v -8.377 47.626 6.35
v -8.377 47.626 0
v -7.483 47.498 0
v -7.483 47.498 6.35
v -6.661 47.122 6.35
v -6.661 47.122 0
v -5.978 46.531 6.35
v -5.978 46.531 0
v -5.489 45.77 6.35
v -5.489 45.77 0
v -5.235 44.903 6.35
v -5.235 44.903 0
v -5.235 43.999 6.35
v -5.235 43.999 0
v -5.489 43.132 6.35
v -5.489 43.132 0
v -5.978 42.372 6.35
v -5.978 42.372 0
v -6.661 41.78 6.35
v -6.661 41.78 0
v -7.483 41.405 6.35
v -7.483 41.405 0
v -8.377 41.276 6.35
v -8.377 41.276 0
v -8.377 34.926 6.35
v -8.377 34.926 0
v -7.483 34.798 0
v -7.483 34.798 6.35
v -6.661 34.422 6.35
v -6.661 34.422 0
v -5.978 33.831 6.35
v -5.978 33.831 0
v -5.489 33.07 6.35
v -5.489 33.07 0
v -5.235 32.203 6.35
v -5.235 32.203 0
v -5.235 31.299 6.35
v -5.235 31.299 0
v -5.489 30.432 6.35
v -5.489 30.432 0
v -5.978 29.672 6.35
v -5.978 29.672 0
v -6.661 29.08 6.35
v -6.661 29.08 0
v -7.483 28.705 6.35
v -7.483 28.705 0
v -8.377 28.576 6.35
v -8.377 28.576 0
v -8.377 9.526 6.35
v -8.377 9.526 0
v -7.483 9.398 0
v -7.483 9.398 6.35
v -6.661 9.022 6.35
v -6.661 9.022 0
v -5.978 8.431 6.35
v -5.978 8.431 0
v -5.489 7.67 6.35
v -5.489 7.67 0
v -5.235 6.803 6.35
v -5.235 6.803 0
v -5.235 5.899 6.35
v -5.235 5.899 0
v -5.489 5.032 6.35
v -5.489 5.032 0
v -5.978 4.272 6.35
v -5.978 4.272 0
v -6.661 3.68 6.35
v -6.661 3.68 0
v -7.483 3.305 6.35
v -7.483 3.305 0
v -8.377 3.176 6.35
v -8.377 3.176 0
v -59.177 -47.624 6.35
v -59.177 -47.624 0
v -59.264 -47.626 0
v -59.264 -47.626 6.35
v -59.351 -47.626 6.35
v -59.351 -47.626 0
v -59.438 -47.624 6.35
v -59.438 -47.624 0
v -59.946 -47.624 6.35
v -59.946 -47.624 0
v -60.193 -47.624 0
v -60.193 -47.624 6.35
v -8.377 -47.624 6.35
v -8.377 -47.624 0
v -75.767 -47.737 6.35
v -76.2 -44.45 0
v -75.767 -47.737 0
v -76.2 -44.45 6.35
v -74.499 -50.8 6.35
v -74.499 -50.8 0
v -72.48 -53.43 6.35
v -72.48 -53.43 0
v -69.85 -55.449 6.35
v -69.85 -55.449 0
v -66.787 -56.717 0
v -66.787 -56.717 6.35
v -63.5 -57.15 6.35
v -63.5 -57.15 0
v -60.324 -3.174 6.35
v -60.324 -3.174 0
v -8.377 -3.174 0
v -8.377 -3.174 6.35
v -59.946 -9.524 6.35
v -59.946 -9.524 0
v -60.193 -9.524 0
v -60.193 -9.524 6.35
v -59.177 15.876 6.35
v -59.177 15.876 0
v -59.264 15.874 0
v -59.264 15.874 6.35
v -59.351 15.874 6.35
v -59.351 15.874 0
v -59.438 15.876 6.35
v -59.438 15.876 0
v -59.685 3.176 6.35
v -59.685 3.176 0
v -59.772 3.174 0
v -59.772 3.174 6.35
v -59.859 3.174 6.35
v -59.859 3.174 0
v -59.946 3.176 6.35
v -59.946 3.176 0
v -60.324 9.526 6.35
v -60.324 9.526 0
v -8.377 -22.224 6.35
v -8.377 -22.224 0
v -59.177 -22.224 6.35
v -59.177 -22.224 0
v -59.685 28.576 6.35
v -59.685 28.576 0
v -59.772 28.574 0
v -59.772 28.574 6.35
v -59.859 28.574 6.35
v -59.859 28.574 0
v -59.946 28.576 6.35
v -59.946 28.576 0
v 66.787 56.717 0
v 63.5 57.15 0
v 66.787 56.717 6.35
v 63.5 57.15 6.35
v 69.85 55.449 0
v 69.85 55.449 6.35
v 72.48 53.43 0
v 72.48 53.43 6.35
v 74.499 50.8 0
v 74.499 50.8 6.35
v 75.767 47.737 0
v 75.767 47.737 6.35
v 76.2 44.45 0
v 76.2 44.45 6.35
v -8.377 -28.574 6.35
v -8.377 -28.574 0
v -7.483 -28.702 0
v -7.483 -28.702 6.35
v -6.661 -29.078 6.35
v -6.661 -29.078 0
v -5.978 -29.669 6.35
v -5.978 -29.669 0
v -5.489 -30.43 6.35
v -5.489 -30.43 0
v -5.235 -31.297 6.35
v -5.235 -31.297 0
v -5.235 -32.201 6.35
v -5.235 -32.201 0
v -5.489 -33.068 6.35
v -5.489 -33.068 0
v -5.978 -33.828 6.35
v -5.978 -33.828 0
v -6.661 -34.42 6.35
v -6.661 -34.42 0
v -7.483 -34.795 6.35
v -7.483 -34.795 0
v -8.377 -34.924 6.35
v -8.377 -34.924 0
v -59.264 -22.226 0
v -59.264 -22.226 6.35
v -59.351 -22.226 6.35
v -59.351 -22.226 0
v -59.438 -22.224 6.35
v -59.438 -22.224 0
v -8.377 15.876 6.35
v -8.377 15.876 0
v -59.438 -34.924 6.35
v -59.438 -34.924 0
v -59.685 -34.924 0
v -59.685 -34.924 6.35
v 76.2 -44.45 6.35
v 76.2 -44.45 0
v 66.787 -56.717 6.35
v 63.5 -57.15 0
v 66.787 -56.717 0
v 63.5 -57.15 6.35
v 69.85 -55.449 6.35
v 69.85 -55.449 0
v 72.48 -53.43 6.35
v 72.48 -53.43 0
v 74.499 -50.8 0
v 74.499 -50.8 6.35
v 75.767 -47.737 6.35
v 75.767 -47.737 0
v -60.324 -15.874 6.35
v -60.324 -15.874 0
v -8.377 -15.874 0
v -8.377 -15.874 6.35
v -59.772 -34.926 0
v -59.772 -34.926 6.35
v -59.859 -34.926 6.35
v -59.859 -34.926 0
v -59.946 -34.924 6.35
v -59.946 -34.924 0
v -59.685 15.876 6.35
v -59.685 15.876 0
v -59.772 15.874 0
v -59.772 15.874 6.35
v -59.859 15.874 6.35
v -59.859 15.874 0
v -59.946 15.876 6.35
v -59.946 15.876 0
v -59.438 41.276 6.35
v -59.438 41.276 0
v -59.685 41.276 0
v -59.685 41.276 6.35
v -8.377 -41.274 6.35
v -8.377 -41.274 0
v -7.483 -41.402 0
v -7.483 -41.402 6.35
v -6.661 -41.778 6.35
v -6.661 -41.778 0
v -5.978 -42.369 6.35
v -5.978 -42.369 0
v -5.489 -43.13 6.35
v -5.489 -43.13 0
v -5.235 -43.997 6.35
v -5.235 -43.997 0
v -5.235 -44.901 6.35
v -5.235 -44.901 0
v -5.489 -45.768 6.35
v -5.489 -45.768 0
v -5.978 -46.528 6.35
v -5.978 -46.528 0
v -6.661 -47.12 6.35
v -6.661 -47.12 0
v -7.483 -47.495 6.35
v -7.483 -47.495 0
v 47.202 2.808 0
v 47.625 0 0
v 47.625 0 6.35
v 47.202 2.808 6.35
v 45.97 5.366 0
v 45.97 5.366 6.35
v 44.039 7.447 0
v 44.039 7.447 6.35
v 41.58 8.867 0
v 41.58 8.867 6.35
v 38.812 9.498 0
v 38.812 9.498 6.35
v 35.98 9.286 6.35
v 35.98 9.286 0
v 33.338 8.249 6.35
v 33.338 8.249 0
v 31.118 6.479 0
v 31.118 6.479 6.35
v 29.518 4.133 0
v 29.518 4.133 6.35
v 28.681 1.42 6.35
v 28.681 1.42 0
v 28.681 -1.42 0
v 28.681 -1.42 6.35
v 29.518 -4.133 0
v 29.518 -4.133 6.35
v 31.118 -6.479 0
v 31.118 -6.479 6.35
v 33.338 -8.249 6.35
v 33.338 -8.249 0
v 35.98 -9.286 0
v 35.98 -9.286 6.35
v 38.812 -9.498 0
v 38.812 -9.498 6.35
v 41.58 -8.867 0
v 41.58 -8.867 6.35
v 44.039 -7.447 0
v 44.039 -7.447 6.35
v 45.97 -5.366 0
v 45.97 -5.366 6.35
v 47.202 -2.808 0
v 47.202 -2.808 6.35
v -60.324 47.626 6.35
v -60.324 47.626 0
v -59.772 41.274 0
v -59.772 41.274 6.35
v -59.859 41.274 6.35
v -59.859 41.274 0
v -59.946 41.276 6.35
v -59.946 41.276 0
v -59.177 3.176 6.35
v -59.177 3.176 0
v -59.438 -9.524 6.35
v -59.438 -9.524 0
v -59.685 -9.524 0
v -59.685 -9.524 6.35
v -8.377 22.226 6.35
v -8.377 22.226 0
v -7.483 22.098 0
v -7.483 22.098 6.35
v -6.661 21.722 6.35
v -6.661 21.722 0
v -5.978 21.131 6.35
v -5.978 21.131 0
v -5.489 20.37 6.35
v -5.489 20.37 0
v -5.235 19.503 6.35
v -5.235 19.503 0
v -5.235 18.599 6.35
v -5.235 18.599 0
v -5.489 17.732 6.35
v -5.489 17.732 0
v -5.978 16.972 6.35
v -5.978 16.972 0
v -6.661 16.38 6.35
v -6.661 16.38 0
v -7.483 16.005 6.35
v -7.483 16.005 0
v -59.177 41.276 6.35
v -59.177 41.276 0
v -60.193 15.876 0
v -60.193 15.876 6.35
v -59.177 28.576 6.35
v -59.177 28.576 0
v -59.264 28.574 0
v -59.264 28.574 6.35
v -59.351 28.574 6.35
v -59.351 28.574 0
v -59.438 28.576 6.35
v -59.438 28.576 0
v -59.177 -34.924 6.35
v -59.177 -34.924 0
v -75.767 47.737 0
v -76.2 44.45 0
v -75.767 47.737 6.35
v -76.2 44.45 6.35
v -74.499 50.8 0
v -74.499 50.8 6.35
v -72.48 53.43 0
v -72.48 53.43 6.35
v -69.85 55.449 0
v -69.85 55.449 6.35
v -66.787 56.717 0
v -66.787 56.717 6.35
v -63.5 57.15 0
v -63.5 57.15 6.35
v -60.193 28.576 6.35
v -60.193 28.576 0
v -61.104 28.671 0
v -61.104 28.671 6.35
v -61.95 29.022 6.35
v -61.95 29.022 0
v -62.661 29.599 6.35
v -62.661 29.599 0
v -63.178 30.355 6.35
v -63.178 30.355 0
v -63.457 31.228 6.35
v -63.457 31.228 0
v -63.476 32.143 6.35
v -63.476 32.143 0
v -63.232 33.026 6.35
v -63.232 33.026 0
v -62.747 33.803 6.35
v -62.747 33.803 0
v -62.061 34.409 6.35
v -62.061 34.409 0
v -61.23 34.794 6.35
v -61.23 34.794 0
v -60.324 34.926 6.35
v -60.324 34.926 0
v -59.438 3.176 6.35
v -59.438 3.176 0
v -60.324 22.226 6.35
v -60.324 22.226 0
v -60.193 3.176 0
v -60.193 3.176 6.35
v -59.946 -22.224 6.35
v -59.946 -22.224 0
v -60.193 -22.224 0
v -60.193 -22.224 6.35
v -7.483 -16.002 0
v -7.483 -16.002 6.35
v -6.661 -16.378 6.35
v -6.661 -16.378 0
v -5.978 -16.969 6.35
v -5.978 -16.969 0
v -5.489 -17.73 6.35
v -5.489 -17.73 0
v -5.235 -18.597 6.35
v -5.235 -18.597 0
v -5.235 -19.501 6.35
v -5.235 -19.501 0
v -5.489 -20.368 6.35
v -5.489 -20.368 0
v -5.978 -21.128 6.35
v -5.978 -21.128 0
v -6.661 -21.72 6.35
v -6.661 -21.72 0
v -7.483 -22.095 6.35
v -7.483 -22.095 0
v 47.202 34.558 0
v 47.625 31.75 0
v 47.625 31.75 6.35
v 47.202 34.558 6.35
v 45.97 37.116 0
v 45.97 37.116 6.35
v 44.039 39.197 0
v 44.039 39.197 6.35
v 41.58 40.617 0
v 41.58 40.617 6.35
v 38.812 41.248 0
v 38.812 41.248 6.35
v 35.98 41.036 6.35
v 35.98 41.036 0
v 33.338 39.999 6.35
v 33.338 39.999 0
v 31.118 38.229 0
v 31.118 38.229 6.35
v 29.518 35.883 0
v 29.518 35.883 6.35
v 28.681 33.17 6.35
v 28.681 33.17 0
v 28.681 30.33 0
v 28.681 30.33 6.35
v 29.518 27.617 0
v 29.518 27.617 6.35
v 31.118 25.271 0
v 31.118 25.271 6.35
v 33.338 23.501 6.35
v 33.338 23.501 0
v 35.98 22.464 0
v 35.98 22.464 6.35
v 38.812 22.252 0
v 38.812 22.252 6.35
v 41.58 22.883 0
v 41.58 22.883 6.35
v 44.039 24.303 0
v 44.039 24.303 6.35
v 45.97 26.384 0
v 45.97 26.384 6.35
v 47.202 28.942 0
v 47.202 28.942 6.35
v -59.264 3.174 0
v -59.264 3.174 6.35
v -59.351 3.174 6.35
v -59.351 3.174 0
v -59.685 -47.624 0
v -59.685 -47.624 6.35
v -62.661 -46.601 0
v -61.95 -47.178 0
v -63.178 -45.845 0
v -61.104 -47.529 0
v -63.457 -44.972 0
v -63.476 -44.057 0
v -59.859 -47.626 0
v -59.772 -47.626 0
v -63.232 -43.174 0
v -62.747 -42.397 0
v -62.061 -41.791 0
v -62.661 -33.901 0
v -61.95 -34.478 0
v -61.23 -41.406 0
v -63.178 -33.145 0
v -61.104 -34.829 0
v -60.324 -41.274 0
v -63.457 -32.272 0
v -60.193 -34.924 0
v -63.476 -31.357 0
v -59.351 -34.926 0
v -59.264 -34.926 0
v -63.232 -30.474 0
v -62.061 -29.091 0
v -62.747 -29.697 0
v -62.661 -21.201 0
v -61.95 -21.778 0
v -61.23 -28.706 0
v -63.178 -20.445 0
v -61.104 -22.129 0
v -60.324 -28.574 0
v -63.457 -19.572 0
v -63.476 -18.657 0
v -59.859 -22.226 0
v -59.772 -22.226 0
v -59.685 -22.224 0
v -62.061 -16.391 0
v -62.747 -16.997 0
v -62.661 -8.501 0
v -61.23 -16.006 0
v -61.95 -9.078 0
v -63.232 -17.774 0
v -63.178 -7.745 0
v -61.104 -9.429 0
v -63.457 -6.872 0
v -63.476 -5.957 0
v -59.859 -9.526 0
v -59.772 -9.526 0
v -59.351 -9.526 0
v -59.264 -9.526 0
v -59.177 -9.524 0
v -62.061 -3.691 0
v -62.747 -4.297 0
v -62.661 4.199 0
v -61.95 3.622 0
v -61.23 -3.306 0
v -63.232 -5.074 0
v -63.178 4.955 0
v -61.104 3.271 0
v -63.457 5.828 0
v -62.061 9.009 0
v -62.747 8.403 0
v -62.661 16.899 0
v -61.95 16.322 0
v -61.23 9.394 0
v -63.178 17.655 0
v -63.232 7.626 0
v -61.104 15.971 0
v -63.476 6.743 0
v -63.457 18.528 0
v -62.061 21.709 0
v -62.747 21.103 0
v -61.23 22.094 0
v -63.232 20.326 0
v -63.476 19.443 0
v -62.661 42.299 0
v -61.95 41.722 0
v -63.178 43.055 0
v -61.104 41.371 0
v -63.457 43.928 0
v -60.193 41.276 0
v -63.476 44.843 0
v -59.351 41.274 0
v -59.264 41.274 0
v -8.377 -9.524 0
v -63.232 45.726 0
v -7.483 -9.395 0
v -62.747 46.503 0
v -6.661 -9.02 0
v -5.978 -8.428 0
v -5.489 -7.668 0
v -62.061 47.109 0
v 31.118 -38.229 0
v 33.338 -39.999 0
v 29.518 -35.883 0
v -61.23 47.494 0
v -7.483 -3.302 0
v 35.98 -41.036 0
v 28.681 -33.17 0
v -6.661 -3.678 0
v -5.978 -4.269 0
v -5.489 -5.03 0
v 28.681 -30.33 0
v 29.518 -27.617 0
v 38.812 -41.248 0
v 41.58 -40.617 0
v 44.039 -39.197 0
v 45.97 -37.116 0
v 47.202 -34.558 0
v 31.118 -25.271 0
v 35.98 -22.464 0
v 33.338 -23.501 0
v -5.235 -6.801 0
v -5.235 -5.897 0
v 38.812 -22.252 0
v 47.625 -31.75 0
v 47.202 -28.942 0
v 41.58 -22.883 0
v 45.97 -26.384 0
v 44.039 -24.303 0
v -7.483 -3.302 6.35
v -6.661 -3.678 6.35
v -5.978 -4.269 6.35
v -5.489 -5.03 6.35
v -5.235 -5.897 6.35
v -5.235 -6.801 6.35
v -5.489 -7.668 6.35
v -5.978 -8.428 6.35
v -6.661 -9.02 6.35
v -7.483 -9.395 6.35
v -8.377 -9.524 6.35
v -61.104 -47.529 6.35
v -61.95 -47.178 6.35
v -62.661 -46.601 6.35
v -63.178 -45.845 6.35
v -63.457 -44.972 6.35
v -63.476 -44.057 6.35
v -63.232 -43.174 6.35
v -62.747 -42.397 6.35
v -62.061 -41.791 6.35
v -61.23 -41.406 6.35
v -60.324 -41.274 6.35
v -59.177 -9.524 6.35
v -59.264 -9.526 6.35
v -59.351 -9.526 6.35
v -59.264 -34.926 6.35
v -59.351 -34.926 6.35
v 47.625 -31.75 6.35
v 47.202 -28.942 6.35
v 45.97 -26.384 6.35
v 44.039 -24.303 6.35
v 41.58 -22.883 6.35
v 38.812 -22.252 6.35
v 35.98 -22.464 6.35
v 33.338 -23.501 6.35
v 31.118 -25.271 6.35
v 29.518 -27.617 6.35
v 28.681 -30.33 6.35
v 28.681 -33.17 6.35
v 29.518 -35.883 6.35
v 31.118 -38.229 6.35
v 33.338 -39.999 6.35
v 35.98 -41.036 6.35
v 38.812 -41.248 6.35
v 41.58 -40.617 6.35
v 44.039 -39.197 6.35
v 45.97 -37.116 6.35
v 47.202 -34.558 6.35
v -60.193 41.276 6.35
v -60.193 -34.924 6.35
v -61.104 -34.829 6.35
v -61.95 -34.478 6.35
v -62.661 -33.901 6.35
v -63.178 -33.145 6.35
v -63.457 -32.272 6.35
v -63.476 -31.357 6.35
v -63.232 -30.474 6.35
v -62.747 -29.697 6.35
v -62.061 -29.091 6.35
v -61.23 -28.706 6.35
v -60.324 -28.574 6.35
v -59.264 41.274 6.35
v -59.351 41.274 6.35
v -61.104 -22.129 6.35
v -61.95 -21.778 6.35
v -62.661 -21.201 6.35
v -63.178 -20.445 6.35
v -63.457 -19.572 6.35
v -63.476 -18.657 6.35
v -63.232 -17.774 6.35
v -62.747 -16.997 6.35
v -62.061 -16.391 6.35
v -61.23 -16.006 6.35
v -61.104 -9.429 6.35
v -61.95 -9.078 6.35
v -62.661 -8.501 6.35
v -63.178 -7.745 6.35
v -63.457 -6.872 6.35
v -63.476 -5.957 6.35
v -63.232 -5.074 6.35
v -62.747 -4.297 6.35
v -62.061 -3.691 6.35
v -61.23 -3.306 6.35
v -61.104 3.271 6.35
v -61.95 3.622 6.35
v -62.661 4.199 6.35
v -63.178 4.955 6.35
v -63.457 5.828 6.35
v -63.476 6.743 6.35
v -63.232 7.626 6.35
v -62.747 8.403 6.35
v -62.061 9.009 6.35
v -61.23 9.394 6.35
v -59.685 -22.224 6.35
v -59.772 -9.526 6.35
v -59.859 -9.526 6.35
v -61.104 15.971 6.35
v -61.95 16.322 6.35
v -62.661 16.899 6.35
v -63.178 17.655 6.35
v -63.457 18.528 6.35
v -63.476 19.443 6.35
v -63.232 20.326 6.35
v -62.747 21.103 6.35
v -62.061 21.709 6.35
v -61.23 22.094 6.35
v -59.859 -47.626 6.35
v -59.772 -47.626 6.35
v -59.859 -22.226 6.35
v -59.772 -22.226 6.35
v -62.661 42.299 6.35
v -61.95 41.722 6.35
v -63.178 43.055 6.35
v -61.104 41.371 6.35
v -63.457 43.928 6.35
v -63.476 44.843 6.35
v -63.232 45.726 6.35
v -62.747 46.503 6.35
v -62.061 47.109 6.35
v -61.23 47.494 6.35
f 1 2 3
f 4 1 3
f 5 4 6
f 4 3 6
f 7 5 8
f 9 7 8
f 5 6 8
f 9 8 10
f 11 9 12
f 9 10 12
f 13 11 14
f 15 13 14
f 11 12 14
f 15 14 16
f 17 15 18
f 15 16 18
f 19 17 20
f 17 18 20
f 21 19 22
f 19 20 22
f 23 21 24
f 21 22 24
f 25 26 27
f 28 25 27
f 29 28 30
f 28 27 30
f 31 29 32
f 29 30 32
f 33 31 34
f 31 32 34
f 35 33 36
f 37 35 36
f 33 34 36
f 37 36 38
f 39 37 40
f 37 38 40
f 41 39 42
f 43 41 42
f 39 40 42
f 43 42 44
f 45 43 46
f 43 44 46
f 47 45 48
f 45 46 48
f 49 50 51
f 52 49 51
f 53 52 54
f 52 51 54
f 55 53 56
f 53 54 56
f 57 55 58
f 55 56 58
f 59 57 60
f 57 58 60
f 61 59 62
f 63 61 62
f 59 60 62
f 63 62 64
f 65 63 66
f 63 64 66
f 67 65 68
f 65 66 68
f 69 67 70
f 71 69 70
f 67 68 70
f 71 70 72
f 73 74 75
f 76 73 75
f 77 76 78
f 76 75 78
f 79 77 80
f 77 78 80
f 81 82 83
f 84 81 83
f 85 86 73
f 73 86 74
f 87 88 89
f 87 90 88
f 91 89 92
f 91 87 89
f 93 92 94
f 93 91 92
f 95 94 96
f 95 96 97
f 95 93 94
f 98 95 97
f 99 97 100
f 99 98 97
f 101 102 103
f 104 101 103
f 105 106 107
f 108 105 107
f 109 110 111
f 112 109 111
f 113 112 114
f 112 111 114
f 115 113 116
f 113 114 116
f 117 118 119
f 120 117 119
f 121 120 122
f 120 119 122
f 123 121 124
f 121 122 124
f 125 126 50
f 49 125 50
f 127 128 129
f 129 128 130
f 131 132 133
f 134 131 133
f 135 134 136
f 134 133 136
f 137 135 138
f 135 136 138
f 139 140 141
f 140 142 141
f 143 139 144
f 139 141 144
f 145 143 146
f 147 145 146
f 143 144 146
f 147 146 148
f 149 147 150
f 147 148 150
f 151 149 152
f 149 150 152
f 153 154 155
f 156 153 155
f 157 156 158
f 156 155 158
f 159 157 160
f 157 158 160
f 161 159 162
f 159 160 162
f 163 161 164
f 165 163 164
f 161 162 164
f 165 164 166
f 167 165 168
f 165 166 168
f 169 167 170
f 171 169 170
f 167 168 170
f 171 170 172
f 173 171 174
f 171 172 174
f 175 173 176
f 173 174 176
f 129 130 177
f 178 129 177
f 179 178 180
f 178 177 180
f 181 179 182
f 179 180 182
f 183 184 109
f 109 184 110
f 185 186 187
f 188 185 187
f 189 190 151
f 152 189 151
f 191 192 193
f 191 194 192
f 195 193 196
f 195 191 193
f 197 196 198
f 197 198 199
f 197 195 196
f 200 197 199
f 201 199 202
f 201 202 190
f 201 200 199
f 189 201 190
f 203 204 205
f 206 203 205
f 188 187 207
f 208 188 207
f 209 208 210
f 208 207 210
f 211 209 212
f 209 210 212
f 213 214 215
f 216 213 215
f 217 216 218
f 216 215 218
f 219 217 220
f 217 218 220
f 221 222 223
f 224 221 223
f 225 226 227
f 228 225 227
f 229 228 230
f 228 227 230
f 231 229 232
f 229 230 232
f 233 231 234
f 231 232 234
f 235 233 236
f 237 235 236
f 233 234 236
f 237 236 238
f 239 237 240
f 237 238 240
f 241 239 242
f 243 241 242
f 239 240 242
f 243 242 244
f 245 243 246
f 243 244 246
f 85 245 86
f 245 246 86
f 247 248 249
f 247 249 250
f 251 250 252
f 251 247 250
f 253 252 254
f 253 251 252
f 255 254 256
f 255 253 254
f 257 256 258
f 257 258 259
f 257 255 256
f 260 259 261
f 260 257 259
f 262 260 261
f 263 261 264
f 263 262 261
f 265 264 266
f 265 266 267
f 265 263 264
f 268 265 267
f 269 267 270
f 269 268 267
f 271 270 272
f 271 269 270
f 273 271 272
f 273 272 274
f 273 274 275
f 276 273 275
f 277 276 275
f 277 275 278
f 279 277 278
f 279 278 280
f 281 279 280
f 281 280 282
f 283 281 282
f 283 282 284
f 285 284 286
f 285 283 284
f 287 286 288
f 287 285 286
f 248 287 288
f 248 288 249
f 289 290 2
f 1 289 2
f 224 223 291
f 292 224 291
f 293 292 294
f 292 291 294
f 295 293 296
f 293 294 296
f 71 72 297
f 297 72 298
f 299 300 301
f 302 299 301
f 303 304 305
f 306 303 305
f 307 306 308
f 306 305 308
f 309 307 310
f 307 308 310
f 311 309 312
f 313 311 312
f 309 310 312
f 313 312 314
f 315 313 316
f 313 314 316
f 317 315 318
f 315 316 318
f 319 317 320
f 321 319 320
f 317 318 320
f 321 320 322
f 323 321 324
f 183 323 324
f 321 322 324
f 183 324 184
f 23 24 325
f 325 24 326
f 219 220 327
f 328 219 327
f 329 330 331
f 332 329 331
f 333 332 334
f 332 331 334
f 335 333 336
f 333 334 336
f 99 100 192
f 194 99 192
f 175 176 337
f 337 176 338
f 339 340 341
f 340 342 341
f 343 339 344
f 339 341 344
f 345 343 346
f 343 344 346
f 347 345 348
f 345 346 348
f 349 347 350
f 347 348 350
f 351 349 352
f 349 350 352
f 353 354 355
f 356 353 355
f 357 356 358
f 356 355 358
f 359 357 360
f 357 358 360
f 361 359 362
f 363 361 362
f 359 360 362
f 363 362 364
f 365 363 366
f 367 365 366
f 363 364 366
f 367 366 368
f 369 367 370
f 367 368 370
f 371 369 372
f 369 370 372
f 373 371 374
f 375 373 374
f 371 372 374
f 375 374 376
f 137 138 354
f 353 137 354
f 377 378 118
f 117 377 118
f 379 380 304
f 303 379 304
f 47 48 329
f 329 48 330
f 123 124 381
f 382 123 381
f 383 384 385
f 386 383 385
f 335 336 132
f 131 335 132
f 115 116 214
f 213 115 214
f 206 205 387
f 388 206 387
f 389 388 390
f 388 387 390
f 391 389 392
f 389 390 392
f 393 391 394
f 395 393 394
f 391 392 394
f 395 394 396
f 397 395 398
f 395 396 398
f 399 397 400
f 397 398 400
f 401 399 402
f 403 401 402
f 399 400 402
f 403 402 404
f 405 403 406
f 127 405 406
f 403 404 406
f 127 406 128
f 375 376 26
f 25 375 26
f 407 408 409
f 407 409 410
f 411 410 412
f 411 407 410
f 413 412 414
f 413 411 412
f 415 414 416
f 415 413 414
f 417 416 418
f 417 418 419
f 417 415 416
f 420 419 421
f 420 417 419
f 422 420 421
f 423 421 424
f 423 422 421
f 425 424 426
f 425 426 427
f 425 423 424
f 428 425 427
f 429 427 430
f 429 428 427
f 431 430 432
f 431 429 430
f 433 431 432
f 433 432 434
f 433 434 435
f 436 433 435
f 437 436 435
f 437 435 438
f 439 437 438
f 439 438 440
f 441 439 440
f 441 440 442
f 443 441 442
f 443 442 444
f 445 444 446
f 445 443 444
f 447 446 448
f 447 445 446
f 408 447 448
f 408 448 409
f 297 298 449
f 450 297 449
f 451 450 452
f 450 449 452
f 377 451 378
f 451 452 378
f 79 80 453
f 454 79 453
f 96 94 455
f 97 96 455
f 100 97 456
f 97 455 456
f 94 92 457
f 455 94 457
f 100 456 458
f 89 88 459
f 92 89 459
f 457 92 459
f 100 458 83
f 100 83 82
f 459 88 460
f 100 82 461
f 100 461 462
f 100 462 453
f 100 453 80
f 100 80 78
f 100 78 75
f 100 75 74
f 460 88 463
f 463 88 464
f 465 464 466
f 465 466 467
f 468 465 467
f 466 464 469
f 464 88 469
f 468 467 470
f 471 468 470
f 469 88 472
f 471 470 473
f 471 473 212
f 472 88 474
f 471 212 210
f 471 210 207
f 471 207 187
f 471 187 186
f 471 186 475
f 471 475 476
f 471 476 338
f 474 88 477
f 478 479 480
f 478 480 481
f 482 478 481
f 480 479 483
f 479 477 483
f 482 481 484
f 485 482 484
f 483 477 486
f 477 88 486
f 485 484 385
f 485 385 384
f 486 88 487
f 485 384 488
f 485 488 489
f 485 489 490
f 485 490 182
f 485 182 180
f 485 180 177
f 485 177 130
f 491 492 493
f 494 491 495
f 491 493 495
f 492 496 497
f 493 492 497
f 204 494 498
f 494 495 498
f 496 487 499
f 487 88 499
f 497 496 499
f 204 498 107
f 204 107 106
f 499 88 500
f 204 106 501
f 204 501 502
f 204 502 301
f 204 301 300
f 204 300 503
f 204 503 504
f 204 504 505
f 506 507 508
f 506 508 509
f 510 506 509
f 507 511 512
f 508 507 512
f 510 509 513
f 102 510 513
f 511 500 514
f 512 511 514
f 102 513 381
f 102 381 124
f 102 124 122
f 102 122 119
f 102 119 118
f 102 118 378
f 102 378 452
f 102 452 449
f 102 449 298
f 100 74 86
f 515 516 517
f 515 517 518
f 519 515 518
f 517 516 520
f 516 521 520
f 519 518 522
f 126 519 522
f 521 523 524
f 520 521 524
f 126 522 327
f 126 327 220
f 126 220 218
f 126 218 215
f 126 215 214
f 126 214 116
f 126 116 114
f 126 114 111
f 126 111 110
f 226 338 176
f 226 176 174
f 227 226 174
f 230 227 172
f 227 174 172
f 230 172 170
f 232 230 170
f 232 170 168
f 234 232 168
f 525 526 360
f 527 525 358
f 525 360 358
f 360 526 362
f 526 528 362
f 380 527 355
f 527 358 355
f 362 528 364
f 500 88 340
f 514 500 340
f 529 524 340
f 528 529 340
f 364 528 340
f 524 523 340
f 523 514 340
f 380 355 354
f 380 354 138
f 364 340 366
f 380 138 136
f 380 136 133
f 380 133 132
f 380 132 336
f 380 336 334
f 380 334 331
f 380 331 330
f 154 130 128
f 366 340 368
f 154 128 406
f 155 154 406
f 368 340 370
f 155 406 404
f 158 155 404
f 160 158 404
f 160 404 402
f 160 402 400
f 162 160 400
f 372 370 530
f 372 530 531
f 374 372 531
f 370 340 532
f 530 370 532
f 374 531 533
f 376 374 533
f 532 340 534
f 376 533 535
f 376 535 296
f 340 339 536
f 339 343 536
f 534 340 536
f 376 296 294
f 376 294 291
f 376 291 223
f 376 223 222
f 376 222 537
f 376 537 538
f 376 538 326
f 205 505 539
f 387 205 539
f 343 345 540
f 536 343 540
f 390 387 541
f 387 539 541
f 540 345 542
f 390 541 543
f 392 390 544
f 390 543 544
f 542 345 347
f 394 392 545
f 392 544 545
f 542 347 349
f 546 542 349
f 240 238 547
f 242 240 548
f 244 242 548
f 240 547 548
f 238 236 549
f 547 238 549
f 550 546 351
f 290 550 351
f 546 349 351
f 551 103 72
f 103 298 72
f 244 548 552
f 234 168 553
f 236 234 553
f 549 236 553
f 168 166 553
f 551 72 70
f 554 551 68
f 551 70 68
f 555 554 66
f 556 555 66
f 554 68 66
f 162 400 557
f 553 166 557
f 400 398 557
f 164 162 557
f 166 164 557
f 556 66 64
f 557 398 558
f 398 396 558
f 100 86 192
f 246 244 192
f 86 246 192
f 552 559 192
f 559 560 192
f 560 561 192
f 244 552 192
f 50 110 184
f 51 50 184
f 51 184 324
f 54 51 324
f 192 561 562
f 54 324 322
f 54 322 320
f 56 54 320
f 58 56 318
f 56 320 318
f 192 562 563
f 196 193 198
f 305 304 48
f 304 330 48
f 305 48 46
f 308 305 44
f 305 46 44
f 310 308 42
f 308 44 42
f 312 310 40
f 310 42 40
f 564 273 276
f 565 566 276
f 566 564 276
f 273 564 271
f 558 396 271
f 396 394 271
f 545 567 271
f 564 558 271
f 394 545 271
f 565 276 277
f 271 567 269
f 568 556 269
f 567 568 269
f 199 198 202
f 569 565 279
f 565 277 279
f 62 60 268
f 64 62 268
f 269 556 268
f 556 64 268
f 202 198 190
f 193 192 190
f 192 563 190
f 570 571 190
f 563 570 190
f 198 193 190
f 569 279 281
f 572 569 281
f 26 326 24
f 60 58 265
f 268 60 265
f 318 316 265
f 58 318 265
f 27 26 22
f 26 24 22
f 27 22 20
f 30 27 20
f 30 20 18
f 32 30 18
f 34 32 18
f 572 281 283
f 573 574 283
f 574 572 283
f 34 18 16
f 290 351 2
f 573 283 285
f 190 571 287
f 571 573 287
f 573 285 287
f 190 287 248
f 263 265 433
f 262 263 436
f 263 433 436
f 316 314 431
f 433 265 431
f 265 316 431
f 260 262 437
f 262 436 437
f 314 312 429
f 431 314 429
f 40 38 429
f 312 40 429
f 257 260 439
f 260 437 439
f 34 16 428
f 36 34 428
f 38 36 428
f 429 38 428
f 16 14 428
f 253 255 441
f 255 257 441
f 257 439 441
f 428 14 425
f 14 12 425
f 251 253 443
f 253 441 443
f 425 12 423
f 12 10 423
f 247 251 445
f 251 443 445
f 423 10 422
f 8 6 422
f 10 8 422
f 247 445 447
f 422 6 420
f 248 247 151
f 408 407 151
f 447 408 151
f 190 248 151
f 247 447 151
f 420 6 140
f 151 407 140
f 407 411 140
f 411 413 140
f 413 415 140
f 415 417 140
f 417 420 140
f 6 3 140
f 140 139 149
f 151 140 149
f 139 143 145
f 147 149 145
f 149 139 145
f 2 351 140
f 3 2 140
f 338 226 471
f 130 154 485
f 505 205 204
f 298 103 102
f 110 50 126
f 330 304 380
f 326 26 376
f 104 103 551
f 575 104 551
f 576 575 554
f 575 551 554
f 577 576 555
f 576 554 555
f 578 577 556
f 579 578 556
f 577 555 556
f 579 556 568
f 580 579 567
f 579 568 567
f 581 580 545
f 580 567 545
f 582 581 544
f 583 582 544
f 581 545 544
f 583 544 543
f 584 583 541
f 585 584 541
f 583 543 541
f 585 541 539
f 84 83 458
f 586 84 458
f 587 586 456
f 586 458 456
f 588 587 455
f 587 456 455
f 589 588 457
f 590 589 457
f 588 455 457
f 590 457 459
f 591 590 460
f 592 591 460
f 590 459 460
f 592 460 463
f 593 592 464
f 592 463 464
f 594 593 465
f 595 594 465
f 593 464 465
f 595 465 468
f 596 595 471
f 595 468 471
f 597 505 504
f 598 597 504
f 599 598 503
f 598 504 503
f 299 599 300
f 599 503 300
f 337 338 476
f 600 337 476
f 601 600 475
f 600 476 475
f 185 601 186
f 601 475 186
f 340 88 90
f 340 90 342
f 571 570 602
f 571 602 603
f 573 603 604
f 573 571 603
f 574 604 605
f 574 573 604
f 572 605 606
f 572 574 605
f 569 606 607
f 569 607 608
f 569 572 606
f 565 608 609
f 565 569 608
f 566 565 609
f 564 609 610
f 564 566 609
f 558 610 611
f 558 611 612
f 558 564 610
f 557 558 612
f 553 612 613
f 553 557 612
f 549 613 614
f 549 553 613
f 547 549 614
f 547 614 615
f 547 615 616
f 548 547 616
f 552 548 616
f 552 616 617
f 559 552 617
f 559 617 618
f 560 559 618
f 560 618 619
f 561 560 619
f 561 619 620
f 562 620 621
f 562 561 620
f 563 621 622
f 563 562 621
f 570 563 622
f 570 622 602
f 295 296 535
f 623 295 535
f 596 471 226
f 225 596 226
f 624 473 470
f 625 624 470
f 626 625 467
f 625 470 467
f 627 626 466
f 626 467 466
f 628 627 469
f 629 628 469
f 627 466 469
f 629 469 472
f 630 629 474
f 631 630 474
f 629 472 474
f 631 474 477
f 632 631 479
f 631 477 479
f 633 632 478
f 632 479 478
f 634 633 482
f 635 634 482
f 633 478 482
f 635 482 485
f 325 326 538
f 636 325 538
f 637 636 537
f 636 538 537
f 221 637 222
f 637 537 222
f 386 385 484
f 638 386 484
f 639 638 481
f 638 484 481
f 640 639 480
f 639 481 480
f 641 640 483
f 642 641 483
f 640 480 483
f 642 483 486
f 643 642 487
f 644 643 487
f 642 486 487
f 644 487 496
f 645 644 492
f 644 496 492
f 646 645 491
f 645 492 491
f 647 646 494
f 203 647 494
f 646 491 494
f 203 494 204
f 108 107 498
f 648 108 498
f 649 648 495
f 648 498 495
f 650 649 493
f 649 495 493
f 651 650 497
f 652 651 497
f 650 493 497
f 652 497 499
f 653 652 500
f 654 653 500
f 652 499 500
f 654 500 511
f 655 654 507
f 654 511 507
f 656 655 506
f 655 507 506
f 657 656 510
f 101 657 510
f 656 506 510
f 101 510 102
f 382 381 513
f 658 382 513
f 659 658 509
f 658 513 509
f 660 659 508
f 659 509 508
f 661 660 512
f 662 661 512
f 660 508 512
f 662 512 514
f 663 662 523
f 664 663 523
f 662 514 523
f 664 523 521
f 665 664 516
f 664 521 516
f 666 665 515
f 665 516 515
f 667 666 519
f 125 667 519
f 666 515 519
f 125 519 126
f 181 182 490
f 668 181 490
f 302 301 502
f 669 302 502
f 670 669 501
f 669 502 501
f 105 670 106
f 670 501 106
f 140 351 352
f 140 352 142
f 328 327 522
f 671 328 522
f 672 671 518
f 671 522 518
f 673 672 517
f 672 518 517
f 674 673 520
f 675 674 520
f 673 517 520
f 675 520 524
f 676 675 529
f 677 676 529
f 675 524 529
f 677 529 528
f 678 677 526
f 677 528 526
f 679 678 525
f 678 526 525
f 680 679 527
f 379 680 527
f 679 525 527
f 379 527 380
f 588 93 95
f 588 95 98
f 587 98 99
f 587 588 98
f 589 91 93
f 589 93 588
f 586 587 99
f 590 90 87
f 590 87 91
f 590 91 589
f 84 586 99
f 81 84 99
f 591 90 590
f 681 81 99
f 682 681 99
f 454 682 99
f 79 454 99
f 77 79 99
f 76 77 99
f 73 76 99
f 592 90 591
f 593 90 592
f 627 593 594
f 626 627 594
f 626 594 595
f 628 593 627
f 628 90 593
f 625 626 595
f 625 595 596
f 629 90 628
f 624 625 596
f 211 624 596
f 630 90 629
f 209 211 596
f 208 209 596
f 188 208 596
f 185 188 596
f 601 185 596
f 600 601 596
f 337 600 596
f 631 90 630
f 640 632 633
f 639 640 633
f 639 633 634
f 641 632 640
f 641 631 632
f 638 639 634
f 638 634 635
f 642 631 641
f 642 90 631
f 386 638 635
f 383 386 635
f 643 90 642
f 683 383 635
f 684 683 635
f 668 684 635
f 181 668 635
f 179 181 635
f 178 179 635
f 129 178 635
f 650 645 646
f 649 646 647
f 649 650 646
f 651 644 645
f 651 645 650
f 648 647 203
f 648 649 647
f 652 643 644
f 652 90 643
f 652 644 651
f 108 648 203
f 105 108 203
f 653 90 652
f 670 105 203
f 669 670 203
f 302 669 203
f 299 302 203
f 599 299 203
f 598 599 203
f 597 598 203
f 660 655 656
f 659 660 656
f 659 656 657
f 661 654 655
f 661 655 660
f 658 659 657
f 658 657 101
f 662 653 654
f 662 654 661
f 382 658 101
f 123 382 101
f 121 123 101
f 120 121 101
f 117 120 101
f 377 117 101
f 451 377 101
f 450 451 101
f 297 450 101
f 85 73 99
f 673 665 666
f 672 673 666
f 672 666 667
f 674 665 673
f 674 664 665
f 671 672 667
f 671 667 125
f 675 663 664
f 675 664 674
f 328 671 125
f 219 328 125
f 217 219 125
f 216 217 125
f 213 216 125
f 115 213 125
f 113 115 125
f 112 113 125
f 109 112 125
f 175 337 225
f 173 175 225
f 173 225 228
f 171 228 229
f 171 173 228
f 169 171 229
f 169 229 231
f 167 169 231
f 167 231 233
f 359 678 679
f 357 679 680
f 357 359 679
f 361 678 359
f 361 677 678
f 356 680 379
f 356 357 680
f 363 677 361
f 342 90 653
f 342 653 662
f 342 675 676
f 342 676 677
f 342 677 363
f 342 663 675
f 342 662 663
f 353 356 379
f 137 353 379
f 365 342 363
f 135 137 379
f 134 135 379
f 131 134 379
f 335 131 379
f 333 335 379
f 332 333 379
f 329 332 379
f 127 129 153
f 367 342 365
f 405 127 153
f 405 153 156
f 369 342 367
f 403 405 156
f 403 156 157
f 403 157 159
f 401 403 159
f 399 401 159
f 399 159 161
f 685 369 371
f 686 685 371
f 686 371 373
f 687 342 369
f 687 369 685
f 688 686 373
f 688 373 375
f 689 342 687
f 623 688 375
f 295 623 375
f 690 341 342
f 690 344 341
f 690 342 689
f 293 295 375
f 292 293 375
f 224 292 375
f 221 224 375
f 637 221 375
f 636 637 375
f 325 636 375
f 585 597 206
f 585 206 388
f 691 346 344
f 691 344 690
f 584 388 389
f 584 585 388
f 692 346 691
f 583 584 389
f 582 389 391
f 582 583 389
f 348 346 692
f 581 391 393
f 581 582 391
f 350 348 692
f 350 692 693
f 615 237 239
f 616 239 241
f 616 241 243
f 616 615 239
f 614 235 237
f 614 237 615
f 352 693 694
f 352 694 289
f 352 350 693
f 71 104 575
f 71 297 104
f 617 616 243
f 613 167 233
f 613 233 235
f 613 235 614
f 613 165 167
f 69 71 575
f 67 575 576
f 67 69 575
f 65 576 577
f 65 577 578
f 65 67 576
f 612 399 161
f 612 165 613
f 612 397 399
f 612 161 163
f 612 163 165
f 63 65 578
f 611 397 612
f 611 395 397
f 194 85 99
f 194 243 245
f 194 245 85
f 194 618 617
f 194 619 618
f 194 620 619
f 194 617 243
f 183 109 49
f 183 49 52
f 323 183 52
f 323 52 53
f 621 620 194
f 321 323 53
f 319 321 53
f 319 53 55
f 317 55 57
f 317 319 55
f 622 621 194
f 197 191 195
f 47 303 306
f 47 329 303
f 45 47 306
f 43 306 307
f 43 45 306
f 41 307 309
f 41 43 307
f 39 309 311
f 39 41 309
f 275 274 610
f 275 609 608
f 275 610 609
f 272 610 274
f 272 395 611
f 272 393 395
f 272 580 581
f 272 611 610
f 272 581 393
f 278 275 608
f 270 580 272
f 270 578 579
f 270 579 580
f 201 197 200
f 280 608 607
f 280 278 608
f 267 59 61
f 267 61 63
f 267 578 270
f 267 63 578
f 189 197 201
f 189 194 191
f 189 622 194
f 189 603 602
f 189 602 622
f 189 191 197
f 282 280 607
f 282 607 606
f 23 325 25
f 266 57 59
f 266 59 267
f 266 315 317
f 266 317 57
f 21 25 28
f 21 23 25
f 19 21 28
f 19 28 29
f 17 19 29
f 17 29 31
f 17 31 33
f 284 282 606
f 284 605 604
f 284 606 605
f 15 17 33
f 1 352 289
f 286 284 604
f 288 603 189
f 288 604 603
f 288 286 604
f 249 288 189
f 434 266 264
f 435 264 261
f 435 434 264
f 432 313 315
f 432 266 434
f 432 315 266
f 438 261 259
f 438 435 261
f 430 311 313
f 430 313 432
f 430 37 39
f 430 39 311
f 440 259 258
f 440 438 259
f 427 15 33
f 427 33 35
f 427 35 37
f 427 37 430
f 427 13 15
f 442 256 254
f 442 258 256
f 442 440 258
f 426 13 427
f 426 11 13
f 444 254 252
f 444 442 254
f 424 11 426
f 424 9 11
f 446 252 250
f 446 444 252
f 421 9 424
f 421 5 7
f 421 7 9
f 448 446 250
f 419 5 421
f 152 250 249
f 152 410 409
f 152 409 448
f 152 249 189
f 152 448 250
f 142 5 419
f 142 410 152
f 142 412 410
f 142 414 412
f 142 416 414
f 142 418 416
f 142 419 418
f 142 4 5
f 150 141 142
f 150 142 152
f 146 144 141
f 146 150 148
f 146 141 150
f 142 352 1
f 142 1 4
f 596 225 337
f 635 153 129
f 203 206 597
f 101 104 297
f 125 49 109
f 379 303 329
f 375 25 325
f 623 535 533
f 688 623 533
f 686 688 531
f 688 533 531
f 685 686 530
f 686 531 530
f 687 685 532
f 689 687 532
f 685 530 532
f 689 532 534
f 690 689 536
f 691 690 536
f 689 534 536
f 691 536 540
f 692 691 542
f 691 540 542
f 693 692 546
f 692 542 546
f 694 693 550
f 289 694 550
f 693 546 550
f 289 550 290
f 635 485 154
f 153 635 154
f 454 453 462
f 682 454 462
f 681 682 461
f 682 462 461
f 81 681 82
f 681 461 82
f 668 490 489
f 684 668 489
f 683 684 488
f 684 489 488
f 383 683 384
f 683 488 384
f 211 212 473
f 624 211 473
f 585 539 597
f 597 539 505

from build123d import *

# Parameters (mm, degrees)
F0_W     = 152.4
F0_H     = 114.3
F0_R     = 9.525
F1_DEPTH = 6.35
F2_R     = 12.7


with BuildPart() as f1:
    # F0 (on Top) → F1 (new body)
    with BuildSketch(Plane.XY):
        Rectangle(F0_W, F0_H)
        with BuildLine():
            Line((-8.885304, -47.623662), (-9.393304, -47.623662))
            Line((-9.393304, -47.623662), (-59.177304, -47.623662))
            ThreePointArc((-59.177304, -47.623662), (-59.307662, -47.626338), (-59.43802, -47.623662))
            Line((-59.43802, -47.623662), (-59.685304, -47.623662))
            ThreePointArc((-59.685304, -47.623662), (-59.815662, -47.626338), (-59.94602, -47.623662))
            Line((-59.94602, -47.623662), (-60.193304, -47.623662))
            ThreePointArc((-60.193304, -47.623662), (-63.499331, -44.515193), (-60.323662, -41.273662))
            Line((-60.323662, -41.273662), (-59.815662, -41.273662))
            Line((-59.815662, -41.273662), (-59.307662, -41.273662))
            Line((-59.307662, -41.273662), (-9.393304, -41.273662))
            Line((-9.393304, -41.273662), (-8.885304, -41.273662))
            Line((-8.885304, -41.273662), (-8.377304, -41.273662))
            ThreePointArc((-8.377304, -41.273662), (-5.202304, -44.448662), (-8.377304, -47.623662))
            Line((-8.377304, -47.623662), (-8.885304, -47.623662))
        make_face(mode=Mode.SUBTRACT)
        with BuildLine():
            Line((-8.885304, -34.923662), (-9.393304, -34.923662))
            Line((-9.393304, -34.923662), (-59.177304, -34.923662))
            ThreePointArc((-59.177304, -34.923662), (-59.307662, -34.926338), (-59.43802, -34.923662))
            Line((-59.43802, -34.923662), (-59.685304, -34.923662))
            ThreePointArc((-59.685304, -34.923662), (-59.815662, -34.926338), (-59.94602, -34.923662))
            Line((-59.94602, -34.923662), (-60.193304, -34.923662))
            ThreePointArc((-60.193304, -34.923662), (-63.499331, -31.815193), (-60.323662, -28.573662))
            Line((-60.323662, -28.573662), (-59.815662, -28.573662))
            Line((-59.815662, -28.573662), (-59.307662, -28.573662))
            Line((-59.307662, -28.573662), (-9.393304, -28.573662))
            Line((-9.393304, -28.573662), (-8.885304, -28.573662))
            Line((-8.885304, -28.573662), (-8.377304, -28.573662))
            ThreePointArc((-8.377304, -28.573662), (-5.202304, -31.748662), (-8.377304, -34.923662))
            Line((-8.377304, -34.923662), (-8.885304, -34.923662))
        make_face(mode=Mode.SUBTRACT)
        with BuildLine():
            Line((-8.885304, -22.223662), (-9.393304, -22.223662))
            Line((-9.393304, -22.223662), (-59.177304, -22.223662))
            ThreePointArc((-59.177304, -22.223662), (-59.307662, -22.226338), (-59.43802, -22.223662))
            Line((-59.43802, -22.223662), (-59.685304, -22.223662))
            ThreePointArc((-59.685304, -22.223662), (-59.815662, -22.226338), (-59.94602, -22.223662))
            Line((-59.94602, -22.223662), (-60.193304, -22.223662))
            ThreePointArc((-60.193304, -22.223662), (-63.499331, -19.115193), (-60.323662, -15.873662))
            Line((-60.323662, -15.873662), (-59.815662, -15.873662))
            Line((-59.815662, -15.873662), (-59.307662, -15.873662))
            Line((-59.307662, -15.873662), (-9.393304, -15.873662))
            Line((-9.393304, -15.873662), (-8.885304, -15.873662))
            Line((-8.885304, -15.873662), (-8.377304, -15.873662))
            ThreePointArc((-8.377304, -15.873662), (-5.202304, -19.048662), (-8.377304, -22.223662))
            Line((-8.377304, -22.223662), (-8.885304, -22.223662))
        make_face(mode=Mode.SUBTRACT)
        with BuildLine():
            Line((-8.885304, -9.523662), (-9.393304, -9.523662))
            Line((-9.393304, -9.523662), (-59.177304, -9.523662))
            ThreePointArc((-59.177304, -9.523662), (-59.307662, -9.526338), (-59.43802, -9.523662))
            Line((-59.43802, -9.523662), (-59.685304, -9.523662))
            ThreePointArc((-59.685304, -9.523662), (-59.815662, -9.526338), (-59.94602, -9.523662))
            Line((-59.94602, -9.523662), (-60.193304, -9.523662))
            ThreePointArc((-60.193304, -9.523662), (-63.499331, -6.415193), (-60.323662, -3.173662))
            Line((-60.323662, -3.173662), (-59.815662, -3.173662))
            Line((-59.815662, -3.173662), (-59.307662, -3.173662))
            Line((-59.307662, -3.173662), (-9.393304, -3.173662))
            Line((-9.393304, -3.173662), (-8.885304, -3.173662))
            Line((-8.885304, -3.173662), (-8.377304, -3.173662))
            ThreePointArc((-8.377304, -3.173662), (-5.202304, -6.348662), (-8.377304, -9.523662))
            Line((-8.377304, -9.523662), (-8.885304, -9.523662))
        make_face(mode=Mode.SUBTRACT)
        with Locations((38.1, -31.75)):
            Circle(F0_R, mode=Mode.SUBTRACT)
        with BuildLine():
            Line((-8.885304, 3.176338), (-9.393304, 3.176338))
            Line((-9.393304, 3.176338), (-59.177304, 3.176338))
            ThreePointArc((-59.177304, 3.176338), (-59.307662, 3.173662), (-59.43802, 3.176338))
            Line((-59.43802, 3.176338), (-59.685304, 3.176338))
            ThreePointArc((-59.685304, 3.176338), (-59.815662, 3.173662), (-59.94602, 3.176338))
            Line((-59.94602, 3.176338), (-60.193304, 3.176338))
            ThreePointArc((-60.193304, 3.176338), (-63.499331, 6.284807), (-60.323662, 9.526338))
            Line((-60.323662, 9.526338), (-59.815662, 9.526338))
            Line((-59.815662, 9.526338), (-59.307662, 9.526338))
            Line((-59.307662, 9.526338), (-9.393304, 9.526338))
            Line((-9.393304, 9.526338), (-8.885304, 9.526338))
            Line((-8.885304, 9.526338), (-8.377304, 9.526338))
            ThreePointArc((-8.377304, 9.526338), (-5.202304, 6.351338), (-8.377304, 3.176338))
            Line((-8.377304, 3.176338), (-8.885304, 3.176338))
        make_face(mode=Mode.SUBTRACT)
        with BuildLine():
            Line((-8.885304, 15.876338), (-9.393304, 15.876338))
            Line((-9.393304, 15.876338), (-59.177304, 15.876338))
            ThreePointArc((-59.177304, 15.876338), (-59.307662, 15.873662), (-59.43802, 15.876338))
            Line((-59.43802, 15.876338), (-59.685304, 15.876338))
            ThreePointArc((-59.685304, 15.876338), (-59.815662, 15.873662), (-59.94602, 15.876338))
            Line((-59.94602, 15.876338), (-60.193304, 15.876338))
            ThreePointArc((-60.193304, 15.876338), (-63.499331, 18.984807), (-60.323662, 22.226338))
            Line((-60.323662, 22.226338), (-59.815662, 22.226338))
            Line((-59.815662, 22.226338), (-59.307662, 22.226338))
            Line((-59.307662, 22.226338), (-9.393304, 22.226338))
            Line((-9.393304, 22.226338), (-8.885304, 22.226338))
            Line((-8.885304, 22.226338), (-8.377304, 22.226338))
            ThreePointArc((-8.377304, 22.226338), (-5.202304, 19.051338), (-8.377304, 15.876338))
            Line((-8.377304, 15.876338), (-8.885304, 15.876338))
        make_face(mode=Mode.SUBTRACT)
        with BuildLine():
            Line((-8.885304, 28.576338), (-9.393304, 28.576338))
            Line((-9.393304, 28.576338), (-59.177304, 28.576338))
            ThreePointArc((-59.177304, 28.576338), (-59.307662, 28.573662), (-59.43802, 28.576338))
            Line((-59.43802, 28.576338), (-59.685304, 28.576338))
            ThreePointArc((-59.685304, 28.576338), (-59.815662, 28.573662), (-59.94602, 28.576338))
            Line((-59.94602, 28.576338), (-60.193304, 28.576338))
            ThreePointArc((-60.193304, 28.576338), (-63.499331, 31.684807), (-60.323662, 34.926338))
            Line((-60.323662, 34.926338), (-59.815662, 34.926338))
            Line((-59.815662, 34.926338), (-59.307662, 34.926338))
            Line((-59.307662, 34.926338), (-9.393304, 34.926338))
            Line((-9.393304, 34.926338), (-8.885304, 34.926338))
            Line((-8.885304, 34.926338), (-8.377304, 34.926338))
            ThreePointArc((-8.377304, 34.926338), (-5.202304, 31.751338), (-8.377304, 28.576338))
            Line((-8.377304, 28.576338), (-8.885304, 28.576338))
        make_face(mode=Mode.SUBTRACT)
        with BuildLine():
            Line((-8.885304, 41.276338), (-9.393304, 41.276338))
            Line((-9.393304, 41.276338), (-59.177304, 41.276338))
            ThreePointArc((-59.177304, 41.276338), (-59.307662, 41.273662), (-59.43802, 41.276338))
            Line((-59.43802, 41.276338), (-59.685304, 41.276338))
            ThreePointArc((-59.685304, 41.276338), (-59.815662, 41.273662), (-59.94602, 41.276338))
            Line((-59.94602, 41.276338), (-60.193304, 41.276338))
            ThreePointArc((-60.193304, 41.276338), (-63.499331, 44.384807), (-60.323662, 47.626338))
            Line((-60.323662, 47.626338), (-59.815662, 47.626338))
            Line((-59.815662, 47.626338), (-59.307662, 47.626338))
            Line((-59.307662, 47.626338), (-9.393304, 47.626338))
            Line((-9.393304, 47.626338), (-8.885304, 47.626338))
            Line((-8.885304, 47.626338), (-8.377304, 47.626338))
            ThreePointArc((-8.377304, 47.626338), (-5.202304, 44.451338), (-8.377304, 41.276338))
            Line((-8.377304, 41.276338), (-8.885304, 41.276338))
        make_face(mode=Mode.SUBTRACT)
        with Locations((38.1, 0)):
            Circle(F0_R, mode=Mode.SUBTRACT)
        with Locations((38.1, 31.75)):
            Circle(F0_R, mode=Mode.SUBTRACT)
    extrude(amount=F1_DEPTH)

    # F2
    f2_edges = [f1.edges().sort_by_distance(p)[0] for p in [
        (-76.2, 57.15, 3.175),
        (-76.2, -57.15, 3.175),
        (76.2, 57.15, 3.175),
        (76.2, -57.15, 3.175),
    ]]
    fillet(f2_edges, radius=F2_R)


solid = f1.part
